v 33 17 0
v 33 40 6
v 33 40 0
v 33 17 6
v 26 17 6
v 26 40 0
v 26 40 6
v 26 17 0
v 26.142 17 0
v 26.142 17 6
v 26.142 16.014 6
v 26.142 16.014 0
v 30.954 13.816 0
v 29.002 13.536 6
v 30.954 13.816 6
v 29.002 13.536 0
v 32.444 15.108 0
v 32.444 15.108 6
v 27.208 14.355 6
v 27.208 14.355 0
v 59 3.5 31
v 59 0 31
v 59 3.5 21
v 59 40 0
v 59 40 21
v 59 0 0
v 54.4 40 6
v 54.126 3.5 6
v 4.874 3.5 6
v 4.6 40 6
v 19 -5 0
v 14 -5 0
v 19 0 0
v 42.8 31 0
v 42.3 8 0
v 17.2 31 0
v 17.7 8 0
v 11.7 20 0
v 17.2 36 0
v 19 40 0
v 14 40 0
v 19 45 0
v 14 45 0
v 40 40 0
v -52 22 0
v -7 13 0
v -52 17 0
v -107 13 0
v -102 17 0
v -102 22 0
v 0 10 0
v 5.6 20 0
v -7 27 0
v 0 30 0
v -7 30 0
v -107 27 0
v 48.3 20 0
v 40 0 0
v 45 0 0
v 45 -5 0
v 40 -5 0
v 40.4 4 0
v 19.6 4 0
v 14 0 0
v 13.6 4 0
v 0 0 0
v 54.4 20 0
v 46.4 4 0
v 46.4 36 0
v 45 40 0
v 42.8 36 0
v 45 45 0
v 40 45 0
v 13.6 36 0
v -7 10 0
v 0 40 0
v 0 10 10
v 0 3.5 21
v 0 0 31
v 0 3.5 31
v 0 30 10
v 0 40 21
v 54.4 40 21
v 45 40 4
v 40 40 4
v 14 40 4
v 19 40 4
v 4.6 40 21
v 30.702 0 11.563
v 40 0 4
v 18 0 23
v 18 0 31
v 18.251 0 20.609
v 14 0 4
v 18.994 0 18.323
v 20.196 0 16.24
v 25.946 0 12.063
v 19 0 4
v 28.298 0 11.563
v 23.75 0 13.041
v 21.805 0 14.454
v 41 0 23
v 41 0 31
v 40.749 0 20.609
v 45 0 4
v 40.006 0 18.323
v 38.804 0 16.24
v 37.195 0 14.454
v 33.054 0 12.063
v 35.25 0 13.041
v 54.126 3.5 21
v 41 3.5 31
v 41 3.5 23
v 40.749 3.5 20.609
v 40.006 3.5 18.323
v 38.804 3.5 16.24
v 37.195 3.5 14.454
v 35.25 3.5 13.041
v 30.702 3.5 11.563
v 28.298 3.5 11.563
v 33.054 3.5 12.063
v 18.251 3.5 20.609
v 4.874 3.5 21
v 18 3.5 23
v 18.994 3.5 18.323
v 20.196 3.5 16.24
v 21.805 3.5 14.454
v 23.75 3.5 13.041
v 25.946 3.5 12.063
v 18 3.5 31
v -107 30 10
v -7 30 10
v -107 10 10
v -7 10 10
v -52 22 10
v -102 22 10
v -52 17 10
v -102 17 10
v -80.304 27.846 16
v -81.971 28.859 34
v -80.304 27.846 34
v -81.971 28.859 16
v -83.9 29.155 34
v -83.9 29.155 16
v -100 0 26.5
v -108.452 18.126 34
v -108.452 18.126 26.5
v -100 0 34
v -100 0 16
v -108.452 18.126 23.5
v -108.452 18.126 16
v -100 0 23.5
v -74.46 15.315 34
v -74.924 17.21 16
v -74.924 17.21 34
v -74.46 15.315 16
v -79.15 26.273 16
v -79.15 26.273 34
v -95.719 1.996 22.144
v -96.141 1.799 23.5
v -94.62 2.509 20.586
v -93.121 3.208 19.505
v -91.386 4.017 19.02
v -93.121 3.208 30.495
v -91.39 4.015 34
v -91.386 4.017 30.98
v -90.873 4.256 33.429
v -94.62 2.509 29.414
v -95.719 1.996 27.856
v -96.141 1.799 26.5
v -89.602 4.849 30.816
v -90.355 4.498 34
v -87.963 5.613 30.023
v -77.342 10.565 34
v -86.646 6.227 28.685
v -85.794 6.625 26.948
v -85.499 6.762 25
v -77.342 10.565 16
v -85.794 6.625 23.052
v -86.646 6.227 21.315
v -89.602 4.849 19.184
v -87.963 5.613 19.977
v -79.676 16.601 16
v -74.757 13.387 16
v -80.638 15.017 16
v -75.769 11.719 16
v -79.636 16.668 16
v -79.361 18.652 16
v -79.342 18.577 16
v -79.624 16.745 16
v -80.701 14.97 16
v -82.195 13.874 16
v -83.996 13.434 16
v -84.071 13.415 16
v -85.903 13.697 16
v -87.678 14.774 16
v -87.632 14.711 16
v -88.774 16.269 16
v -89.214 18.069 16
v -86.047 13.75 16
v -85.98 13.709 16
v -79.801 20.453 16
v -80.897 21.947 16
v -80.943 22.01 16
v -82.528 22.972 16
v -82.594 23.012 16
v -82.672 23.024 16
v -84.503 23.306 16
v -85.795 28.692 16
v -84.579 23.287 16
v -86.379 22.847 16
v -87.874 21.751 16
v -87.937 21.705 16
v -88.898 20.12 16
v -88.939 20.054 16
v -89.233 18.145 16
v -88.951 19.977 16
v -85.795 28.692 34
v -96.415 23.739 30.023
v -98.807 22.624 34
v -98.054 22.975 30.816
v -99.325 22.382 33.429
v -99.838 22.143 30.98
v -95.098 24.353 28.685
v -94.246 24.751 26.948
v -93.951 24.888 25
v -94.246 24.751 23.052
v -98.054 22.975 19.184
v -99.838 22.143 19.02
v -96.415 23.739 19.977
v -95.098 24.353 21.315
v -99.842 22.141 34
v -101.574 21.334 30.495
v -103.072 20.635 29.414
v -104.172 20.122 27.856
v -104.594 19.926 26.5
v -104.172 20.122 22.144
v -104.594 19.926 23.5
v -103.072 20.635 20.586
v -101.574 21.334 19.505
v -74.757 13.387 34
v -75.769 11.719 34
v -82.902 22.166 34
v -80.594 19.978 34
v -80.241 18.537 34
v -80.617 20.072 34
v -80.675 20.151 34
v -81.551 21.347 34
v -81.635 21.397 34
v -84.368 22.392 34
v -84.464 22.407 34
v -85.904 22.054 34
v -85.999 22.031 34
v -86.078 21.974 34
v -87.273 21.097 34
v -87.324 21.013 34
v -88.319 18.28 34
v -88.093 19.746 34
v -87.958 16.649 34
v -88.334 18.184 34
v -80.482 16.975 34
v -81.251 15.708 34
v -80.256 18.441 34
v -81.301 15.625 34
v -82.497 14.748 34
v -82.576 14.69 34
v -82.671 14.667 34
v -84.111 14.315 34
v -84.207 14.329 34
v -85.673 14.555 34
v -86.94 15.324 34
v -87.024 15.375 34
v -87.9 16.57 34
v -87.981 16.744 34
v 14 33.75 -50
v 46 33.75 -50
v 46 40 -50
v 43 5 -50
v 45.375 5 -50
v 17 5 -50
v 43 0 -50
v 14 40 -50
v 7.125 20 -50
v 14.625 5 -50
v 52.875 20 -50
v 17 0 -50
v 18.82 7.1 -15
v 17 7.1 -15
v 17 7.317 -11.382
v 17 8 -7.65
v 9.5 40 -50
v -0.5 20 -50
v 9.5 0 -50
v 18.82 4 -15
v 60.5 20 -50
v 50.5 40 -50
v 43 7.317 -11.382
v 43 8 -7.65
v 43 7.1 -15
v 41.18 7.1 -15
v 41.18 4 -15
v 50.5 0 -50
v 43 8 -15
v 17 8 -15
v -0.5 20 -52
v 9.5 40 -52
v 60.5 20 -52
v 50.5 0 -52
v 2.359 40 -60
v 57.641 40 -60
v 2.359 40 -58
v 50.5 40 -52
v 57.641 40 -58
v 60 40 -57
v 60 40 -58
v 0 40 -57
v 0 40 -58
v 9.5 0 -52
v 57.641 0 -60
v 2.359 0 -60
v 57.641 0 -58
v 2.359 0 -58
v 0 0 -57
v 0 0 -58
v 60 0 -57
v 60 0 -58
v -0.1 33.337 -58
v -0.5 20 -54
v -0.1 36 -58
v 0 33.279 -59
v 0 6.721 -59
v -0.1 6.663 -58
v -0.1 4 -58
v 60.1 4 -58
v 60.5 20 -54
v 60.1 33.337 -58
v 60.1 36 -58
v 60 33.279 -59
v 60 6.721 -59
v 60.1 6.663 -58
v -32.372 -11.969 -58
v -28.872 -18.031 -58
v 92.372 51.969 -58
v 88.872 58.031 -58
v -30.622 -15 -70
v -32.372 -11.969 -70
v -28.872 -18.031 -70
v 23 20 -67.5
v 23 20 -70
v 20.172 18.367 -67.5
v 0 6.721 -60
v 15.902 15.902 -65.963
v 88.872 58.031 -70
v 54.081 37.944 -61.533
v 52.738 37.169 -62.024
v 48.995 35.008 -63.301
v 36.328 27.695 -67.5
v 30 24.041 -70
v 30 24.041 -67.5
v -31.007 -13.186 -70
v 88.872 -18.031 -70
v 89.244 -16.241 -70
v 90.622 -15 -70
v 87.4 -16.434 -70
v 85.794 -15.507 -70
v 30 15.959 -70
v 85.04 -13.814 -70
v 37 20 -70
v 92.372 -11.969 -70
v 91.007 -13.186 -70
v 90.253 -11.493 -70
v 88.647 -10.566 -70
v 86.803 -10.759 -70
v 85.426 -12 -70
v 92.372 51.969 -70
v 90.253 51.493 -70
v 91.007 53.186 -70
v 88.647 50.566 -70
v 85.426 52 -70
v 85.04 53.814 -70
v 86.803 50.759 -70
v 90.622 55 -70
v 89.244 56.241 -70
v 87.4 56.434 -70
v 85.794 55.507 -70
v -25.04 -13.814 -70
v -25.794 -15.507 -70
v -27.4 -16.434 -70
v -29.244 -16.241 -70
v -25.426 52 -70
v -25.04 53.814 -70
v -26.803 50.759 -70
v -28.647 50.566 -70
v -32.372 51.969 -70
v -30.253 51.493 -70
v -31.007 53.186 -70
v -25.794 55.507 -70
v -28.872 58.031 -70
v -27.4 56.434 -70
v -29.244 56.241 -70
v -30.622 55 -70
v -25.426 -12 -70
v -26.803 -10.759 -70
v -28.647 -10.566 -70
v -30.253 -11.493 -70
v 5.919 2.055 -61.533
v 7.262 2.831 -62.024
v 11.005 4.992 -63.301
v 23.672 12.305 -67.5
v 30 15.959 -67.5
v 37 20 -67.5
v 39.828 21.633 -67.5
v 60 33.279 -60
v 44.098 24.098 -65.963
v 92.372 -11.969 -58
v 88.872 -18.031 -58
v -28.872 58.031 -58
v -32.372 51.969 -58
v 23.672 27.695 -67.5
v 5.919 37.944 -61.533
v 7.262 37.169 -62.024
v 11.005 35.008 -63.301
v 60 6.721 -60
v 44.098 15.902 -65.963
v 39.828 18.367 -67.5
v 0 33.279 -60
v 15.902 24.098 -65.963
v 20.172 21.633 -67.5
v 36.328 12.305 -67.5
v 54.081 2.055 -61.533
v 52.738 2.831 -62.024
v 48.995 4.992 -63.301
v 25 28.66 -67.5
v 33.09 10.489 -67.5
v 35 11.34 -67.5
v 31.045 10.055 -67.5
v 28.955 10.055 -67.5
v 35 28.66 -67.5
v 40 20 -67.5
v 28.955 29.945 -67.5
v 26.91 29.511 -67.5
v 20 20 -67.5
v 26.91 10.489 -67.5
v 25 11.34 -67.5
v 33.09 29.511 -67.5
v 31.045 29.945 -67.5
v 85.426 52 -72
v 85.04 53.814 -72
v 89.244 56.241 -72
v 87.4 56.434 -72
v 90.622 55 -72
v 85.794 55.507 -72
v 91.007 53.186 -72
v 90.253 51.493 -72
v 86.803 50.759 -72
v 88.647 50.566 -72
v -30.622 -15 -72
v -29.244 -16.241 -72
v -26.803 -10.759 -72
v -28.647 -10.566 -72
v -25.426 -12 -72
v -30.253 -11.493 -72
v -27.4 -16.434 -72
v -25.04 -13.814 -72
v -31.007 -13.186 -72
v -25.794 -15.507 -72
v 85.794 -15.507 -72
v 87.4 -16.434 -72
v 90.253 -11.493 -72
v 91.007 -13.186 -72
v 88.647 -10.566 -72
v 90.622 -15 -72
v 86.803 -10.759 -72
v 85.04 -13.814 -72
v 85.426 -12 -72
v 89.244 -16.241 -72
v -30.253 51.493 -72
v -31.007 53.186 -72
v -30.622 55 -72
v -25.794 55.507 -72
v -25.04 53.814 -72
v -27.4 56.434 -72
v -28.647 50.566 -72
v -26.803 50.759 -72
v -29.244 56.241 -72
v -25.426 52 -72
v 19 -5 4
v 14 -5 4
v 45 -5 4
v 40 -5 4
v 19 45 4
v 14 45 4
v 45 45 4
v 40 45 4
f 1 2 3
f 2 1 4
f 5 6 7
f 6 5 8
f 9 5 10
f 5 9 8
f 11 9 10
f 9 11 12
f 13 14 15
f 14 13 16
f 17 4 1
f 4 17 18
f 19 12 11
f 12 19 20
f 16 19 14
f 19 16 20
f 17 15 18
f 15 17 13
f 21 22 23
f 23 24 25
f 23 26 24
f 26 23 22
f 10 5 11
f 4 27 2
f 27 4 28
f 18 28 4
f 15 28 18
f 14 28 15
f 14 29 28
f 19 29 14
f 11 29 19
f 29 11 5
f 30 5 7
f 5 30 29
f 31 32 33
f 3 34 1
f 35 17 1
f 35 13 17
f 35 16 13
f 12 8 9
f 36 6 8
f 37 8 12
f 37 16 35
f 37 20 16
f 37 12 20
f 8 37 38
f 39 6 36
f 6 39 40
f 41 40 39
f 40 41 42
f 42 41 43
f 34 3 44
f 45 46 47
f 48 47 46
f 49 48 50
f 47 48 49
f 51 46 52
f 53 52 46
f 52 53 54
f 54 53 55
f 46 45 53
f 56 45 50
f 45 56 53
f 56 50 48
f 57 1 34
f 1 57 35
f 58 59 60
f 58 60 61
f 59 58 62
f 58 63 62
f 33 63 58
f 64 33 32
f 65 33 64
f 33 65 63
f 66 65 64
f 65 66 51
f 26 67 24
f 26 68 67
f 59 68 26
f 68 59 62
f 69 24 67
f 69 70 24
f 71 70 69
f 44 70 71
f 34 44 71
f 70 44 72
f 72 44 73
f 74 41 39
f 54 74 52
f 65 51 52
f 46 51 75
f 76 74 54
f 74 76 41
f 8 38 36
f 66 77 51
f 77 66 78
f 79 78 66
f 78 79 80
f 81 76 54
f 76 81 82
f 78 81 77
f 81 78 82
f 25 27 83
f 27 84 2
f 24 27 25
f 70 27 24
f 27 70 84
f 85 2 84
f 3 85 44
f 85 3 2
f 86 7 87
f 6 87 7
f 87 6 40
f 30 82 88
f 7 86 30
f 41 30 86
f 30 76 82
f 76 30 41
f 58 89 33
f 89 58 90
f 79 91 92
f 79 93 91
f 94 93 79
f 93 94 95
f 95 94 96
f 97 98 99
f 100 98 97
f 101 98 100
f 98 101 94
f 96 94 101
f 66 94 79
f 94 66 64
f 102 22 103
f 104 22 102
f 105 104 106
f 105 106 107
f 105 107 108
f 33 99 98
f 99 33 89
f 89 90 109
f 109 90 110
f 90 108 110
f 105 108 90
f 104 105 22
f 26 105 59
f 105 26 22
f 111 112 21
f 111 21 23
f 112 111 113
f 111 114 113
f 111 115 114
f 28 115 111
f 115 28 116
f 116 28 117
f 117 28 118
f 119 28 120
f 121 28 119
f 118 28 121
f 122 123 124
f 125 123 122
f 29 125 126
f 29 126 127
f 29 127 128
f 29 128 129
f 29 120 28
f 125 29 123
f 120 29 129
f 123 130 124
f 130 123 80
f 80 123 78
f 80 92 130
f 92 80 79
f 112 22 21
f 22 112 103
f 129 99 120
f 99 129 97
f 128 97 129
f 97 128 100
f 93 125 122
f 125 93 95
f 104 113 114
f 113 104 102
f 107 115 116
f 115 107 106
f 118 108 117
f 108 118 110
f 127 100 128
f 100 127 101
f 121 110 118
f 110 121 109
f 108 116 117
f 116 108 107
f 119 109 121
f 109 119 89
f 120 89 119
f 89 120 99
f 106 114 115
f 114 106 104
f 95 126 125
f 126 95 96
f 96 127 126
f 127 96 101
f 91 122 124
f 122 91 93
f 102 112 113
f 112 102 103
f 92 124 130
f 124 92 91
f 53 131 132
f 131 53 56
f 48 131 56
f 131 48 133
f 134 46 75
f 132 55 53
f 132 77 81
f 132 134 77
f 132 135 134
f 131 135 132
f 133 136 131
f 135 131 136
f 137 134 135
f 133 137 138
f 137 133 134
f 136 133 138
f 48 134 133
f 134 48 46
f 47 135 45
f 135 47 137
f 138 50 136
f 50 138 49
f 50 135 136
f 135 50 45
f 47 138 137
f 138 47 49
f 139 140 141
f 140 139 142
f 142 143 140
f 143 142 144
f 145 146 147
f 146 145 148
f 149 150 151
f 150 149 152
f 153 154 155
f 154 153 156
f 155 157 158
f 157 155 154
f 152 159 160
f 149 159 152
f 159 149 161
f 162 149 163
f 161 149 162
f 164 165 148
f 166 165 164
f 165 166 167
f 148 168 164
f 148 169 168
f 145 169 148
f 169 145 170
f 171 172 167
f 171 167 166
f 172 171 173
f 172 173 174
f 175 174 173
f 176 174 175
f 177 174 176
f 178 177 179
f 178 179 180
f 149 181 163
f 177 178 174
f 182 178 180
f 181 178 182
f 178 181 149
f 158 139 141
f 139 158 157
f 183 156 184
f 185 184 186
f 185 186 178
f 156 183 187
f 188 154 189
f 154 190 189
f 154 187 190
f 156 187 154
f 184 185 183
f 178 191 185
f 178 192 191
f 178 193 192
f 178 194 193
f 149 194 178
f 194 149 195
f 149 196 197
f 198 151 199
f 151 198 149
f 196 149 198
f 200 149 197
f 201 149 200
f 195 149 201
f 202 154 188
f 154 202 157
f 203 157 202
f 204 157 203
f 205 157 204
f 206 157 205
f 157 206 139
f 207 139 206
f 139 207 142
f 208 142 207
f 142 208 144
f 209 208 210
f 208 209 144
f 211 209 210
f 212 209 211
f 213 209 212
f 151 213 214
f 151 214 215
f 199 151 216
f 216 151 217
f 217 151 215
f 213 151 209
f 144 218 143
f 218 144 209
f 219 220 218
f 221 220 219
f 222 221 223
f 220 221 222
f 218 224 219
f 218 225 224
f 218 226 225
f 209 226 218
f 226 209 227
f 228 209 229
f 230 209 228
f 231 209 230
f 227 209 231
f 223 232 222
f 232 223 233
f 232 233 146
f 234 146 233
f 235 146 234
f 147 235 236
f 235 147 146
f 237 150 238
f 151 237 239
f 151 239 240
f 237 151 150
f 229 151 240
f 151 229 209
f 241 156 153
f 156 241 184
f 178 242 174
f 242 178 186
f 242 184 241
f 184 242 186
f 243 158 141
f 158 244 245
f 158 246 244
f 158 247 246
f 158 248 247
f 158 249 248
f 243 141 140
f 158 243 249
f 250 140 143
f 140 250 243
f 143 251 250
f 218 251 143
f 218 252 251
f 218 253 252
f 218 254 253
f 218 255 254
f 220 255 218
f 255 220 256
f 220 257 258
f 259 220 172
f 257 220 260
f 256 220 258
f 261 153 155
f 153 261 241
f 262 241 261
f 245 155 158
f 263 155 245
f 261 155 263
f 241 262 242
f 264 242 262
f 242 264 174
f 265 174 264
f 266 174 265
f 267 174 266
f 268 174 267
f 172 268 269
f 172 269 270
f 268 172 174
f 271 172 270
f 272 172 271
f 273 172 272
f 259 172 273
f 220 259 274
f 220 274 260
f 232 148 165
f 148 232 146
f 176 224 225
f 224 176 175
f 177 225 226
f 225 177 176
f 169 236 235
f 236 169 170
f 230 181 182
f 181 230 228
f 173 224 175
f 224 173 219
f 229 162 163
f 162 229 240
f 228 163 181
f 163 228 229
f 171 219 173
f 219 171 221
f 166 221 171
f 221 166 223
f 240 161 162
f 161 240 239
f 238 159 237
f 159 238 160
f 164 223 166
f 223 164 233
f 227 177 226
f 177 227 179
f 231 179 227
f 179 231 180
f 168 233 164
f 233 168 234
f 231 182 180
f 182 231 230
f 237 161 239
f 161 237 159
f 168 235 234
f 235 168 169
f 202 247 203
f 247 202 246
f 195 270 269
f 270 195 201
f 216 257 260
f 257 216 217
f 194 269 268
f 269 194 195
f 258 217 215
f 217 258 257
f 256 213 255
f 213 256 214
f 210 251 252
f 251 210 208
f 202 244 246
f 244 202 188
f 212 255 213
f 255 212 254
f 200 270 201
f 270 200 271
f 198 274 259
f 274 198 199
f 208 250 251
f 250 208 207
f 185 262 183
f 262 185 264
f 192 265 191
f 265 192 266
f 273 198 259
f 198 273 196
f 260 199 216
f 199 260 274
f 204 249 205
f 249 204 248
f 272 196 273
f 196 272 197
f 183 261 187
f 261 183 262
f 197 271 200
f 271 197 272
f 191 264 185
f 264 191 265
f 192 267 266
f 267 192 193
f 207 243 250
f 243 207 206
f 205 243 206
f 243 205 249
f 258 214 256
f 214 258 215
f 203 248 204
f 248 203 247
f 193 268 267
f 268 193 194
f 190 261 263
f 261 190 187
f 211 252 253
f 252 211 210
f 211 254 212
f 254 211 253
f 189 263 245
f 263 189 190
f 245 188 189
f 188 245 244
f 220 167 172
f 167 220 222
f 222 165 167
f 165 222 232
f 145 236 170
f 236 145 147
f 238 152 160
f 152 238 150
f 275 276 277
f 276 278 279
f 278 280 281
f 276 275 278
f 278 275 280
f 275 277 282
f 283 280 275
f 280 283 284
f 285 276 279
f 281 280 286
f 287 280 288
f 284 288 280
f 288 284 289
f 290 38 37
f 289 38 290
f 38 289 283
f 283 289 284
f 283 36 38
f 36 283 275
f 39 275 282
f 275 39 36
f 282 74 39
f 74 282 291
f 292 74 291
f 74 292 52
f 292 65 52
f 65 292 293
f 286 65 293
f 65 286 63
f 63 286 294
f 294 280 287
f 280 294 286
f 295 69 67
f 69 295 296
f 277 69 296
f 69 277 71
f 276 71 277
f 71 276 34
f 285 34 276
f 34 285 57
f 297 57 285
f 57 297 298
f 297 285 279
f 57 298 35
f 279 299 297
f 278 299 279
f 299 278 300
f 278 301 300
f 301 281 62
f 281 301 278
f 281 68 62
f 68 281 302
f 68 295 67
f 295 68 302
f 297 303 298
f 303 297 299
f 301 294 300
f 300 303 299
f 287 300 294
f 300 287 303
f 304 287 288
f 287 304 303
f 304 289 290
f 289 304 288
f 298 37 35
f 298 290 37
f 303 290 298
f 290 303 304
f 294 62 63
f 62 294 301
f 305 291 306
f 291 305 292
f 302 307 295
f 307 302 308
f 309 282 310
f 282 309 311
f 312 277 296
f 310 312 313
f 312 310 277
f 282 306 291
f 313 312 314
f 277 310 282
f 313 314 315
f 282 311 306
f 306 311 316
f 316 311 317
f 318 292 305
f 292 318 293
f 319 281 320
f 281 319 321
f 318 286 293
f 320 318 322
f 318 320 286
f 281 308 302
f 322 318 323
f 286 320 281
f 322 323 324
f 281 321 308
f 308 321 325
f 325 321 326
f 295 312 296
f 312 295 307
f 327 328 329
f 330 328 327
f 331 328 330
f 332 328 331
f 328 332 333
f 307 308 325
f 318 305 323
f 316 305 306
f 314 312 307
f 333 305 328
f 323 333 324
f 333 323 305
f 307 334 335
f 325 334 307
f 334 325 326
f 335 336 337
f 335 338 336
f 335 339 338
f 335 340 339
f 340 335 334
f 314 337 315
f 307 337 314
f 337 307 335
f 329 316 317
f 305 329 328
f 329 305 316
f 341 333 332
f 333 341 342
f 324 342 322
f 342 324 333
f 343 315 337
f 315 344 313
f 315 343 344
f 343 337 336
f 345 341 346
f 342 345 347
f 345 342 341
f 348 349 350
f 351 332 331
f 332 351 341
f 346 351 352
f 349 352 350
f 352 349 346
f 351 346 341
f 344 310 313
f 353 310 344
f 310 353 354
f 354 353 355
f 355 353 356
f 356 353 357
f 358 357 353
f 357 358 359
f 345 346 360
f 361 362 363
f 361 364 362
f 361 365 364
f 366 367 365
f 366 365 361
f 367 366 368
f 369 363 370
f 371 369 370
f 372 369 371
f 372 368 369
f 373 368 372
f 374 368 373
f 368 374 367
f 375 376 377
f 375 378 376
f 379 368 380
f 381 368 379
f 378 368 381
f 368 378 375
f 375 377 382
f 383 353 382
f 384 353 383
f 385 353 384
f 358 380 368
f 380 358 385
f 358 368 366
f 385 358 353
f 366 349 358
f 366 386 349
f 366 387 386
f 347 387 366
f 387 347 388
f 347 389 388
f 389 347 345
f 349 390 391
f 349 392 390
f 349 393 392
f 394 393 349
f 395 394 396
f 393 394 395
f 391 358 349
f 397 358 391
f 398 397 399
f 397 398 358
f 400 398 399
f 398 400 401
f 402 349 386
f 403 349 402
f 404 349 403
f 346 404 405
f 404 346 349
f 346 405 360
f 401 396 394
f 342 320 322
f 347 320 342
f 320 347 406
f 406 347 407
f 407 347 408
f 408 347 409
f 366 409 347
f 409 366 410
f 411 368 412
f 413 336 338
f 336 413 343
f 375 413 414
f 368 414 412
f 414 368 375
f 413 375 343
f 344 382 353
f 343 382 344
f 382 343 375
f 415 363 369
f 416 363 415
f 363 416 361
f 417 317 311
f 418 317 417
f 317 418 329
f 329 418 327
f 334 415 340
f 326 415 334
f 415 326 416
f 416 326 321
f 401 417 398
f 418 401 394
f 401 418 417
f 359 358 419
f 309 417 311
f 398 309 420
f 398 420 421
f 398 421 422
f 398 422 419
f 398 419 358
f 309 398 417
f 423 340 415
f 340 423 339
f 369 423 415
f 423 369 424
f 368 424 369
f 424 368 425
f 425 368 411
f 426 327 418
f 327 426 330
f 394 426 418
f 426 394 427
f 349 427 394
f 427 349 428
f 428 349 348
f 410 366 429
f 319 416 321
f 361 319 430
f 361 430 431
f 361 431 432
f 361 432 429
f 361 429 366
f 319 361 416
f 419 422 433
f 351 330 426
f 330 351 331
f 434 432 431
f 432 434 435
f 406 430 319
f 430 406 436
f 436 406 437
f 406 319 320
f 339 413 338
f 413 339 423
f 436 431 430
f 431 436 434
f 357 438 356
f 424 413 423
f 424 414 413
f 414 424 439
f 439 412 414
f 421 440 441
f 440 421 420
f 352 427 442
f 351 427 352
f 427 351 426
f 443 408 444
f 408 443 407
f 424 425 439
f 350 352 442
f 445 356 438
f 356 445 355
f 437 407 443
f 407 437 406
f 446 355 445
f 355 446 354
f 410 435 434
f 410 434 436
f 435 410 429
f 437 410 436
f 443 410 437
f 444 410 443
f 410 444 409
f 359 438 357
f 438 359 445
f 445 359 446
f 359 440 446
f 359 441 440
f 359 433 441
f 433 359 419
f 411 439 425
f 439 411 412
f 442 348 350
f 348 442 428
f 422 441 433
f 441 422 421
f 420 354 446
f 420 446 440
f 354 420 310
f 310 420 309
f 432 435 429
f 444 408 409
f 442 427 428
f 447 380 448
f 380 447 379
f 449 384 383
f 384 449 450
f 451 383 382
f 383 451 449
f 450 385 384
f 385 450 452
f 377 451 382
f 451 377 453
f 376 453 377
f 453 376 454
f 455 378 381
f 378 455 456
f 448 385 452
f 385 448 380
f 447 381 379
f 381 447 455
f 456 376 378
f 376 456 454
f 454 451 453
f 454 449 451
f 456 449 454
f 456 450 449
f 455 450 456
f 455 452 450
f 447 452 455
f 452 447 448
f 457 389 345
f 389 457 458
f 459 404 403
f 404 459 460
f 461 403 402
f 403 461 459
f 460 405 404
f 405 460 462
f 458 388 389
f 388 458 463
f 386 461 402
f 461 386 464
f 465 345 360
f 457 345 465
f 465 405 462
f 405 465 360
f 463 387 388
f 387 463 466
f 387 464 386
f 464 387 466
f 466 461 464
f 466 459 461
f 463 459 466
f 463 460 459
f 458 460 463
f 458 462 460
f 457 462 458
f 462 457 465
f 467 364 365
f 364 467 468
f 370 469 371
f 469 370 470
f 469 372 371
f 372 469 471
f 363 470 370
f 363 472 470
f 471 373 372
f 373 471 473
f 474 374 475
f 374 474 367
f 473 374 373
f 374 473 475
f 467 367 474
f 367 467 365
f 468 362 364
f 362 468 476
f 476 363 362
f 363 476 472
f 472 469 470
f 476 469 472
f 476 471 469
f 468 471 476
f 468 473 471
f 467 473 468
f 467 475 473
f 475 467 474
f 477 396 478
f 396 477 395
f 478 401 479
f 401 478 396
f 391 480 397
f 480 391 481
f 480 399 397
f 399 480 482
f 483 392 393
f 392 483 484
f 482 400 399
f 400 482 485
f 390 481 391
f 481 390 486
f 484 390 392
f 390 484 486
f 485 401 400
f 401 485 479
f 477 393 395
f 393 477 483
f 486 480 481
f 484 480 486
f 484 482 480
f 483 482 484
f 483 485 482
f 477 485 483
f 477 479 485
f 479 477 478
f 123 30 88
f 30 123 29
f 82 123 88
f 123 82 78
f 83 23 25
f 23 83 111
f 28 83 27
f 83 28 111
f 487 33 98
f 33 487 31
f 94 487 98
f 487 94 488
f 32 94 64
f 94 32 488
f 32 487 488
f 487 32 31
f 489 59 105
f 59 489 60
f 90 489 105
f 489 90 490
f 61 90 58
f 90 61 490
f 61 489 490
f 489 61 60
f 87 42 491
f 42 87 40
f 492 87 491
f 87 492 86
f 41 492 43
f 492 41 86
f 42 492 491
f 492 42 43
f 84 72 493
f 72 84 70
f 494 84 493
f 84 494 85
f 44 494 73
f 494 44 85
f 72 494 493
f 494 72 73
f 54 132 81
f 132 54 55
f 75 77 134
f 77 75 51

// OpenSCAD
// camera
*translate([5,5,6]) cube([49,26,35.5]);
//*****************************************************************
//baseplate
difference(){
	cube([59,40,6]);
	color("green")translate([26,17,-1]){
		cube([7,26,8]);
		translate([3.5,0,0])cylinder(8,3.5,3.5);
	}
}
//front wall
difference(){
	union(){
		color("green")translate([0,0,6])cube([59,3.5,5]);
		translate([0,0,11])cube([59,3.5,20]);
	}
	color("red") translate([29.5,4,23]) rotate([90,0,0])cylinder(5,11.5,11.5);
	color("blue") translate([18,-1,23])cube([23,5,20]);
}
//left wall
color("red")translate([0,0,6]){
	linear_extrude(height=15, center=false, convexity=14, twist=0)
	polygon( [ [0,0],[0,40],[4.6,40],[4.9,0] ] );
}
//right wall
color("red")translate([59,0,6]){
	linear_extrude(height=15, center=false, convexity=14, twist=0)
	polygon( [ [0,0],[0,40],[-4.6,40],[-4.9,0] ] );
}

//elastics mounting points
translate([14,-5,])cube([5,5,4]);
translate([40,-5,])cube([5,5,4]);
translate([14,40,])cube([5,5,4]);
translate([40,40,])cube([5,5,4]);


//arm mounting point
translate([-7,10,0])cube([7,20,5]);


//**********************************************

//laser arm
paths = [[0,0],[3,10],[17,10],[20,0]];
translate([-7,5,0]){
	difference(){
		color("green") translate([-50,25,10]) rotate([90,180,90]){
			linear_extrude(height = 100, center = true, convexity = 14, twist = 0) 
			polygon(paths);
		}
		color("blue") translate([-95,12,-5]) cube([50,5,17]);
		*color("purple") translate([0,3,7.5])rotate([0,-86,0]) cube([5,25,40]);
	}
}
color("lime")translate([-7,10,5])cube([7,20,5]);


//******************************************************************
// laser holder
translate([-100,0,25])rotate([0,0,25])difference(){
	linear_extrude(height = 18, center = true, convexity = 14, twist = 0)hull(){
		square([10,20]);
		translate([25,5,0]) circle(5);
		translate([25,15,0]) circle(5);
	}
	translate([10,25,0])rotate([90,0,0])cylinder(30,6,6);
	translate([22,10,-10]) cylinder(20,5,4);
	color("red")translate([3,-5,15.5]) rotate([0,45,0]) cube([10,30,10]);
	color("red")translate([0,-1,-1.5])cube([5,22,3]);
}

//*******************************************************************
translate([30,20,-52]){
	scale_factor = 0.8;
	path_base_pillar =[[-20.5,-20],[20.5,-20],[30.5,0],[20.5,20],[-20.5,20],[-30.5,0]];
	// hexagonal pillars
	translate([0,0,2]) linear_extrude(height = 50, center = false, convexity = 10, scale=scale_factor)
	difference(){
		color("red") polygon(path_base_pillar);
		polygon(path_base_pillar*0.75);
		color("green")translate([0,18,0])square([32,10],true);
		color("green")translate([0,-18,0])square([26,10],true);
	}
	// linking block
	color("purple")translate([-13,-16,37])cube([26,4,15]);

	color("DarkKhaki")
	translate([0,0,0])linear_extrude(height = 2, center = false, convexity = 10)
	polygon(path_base_pillar);

	color("steelblue")hull(){
		translate([0,0,-2])linear_extrude(height = 2, center = false, convexity = 10)
		polygon(path_base_pillar);
		translate([0,0,-6])cube([60,40,2], true);
	}
	// legs
	color("gray")translate([0,0,-12])rotate([0,0,30])cube([140,7,12],true);
	color("gray")translate([0,0,-12])rotate([0,0,-30])cube([140,7,12],true);

	color("lime")hull(){
		translate([0,0,-7])cube([60,40,2], true);
		translate([0,0,-15])cylinder(1,10,10,true);
	}



	rotate([0,0,30])translate([67,0,-20])cylinder(2,3,3);
	rotate([0,0,30])translate([-67,0,-20])cylinder(2,3,3);
	rotate([0,0,-30])translate([67,0,-20])cylinder(2,3,3);
	rotate([0,0,-30])translate([-67,0,-20])cylinder(2,3,3);
}
